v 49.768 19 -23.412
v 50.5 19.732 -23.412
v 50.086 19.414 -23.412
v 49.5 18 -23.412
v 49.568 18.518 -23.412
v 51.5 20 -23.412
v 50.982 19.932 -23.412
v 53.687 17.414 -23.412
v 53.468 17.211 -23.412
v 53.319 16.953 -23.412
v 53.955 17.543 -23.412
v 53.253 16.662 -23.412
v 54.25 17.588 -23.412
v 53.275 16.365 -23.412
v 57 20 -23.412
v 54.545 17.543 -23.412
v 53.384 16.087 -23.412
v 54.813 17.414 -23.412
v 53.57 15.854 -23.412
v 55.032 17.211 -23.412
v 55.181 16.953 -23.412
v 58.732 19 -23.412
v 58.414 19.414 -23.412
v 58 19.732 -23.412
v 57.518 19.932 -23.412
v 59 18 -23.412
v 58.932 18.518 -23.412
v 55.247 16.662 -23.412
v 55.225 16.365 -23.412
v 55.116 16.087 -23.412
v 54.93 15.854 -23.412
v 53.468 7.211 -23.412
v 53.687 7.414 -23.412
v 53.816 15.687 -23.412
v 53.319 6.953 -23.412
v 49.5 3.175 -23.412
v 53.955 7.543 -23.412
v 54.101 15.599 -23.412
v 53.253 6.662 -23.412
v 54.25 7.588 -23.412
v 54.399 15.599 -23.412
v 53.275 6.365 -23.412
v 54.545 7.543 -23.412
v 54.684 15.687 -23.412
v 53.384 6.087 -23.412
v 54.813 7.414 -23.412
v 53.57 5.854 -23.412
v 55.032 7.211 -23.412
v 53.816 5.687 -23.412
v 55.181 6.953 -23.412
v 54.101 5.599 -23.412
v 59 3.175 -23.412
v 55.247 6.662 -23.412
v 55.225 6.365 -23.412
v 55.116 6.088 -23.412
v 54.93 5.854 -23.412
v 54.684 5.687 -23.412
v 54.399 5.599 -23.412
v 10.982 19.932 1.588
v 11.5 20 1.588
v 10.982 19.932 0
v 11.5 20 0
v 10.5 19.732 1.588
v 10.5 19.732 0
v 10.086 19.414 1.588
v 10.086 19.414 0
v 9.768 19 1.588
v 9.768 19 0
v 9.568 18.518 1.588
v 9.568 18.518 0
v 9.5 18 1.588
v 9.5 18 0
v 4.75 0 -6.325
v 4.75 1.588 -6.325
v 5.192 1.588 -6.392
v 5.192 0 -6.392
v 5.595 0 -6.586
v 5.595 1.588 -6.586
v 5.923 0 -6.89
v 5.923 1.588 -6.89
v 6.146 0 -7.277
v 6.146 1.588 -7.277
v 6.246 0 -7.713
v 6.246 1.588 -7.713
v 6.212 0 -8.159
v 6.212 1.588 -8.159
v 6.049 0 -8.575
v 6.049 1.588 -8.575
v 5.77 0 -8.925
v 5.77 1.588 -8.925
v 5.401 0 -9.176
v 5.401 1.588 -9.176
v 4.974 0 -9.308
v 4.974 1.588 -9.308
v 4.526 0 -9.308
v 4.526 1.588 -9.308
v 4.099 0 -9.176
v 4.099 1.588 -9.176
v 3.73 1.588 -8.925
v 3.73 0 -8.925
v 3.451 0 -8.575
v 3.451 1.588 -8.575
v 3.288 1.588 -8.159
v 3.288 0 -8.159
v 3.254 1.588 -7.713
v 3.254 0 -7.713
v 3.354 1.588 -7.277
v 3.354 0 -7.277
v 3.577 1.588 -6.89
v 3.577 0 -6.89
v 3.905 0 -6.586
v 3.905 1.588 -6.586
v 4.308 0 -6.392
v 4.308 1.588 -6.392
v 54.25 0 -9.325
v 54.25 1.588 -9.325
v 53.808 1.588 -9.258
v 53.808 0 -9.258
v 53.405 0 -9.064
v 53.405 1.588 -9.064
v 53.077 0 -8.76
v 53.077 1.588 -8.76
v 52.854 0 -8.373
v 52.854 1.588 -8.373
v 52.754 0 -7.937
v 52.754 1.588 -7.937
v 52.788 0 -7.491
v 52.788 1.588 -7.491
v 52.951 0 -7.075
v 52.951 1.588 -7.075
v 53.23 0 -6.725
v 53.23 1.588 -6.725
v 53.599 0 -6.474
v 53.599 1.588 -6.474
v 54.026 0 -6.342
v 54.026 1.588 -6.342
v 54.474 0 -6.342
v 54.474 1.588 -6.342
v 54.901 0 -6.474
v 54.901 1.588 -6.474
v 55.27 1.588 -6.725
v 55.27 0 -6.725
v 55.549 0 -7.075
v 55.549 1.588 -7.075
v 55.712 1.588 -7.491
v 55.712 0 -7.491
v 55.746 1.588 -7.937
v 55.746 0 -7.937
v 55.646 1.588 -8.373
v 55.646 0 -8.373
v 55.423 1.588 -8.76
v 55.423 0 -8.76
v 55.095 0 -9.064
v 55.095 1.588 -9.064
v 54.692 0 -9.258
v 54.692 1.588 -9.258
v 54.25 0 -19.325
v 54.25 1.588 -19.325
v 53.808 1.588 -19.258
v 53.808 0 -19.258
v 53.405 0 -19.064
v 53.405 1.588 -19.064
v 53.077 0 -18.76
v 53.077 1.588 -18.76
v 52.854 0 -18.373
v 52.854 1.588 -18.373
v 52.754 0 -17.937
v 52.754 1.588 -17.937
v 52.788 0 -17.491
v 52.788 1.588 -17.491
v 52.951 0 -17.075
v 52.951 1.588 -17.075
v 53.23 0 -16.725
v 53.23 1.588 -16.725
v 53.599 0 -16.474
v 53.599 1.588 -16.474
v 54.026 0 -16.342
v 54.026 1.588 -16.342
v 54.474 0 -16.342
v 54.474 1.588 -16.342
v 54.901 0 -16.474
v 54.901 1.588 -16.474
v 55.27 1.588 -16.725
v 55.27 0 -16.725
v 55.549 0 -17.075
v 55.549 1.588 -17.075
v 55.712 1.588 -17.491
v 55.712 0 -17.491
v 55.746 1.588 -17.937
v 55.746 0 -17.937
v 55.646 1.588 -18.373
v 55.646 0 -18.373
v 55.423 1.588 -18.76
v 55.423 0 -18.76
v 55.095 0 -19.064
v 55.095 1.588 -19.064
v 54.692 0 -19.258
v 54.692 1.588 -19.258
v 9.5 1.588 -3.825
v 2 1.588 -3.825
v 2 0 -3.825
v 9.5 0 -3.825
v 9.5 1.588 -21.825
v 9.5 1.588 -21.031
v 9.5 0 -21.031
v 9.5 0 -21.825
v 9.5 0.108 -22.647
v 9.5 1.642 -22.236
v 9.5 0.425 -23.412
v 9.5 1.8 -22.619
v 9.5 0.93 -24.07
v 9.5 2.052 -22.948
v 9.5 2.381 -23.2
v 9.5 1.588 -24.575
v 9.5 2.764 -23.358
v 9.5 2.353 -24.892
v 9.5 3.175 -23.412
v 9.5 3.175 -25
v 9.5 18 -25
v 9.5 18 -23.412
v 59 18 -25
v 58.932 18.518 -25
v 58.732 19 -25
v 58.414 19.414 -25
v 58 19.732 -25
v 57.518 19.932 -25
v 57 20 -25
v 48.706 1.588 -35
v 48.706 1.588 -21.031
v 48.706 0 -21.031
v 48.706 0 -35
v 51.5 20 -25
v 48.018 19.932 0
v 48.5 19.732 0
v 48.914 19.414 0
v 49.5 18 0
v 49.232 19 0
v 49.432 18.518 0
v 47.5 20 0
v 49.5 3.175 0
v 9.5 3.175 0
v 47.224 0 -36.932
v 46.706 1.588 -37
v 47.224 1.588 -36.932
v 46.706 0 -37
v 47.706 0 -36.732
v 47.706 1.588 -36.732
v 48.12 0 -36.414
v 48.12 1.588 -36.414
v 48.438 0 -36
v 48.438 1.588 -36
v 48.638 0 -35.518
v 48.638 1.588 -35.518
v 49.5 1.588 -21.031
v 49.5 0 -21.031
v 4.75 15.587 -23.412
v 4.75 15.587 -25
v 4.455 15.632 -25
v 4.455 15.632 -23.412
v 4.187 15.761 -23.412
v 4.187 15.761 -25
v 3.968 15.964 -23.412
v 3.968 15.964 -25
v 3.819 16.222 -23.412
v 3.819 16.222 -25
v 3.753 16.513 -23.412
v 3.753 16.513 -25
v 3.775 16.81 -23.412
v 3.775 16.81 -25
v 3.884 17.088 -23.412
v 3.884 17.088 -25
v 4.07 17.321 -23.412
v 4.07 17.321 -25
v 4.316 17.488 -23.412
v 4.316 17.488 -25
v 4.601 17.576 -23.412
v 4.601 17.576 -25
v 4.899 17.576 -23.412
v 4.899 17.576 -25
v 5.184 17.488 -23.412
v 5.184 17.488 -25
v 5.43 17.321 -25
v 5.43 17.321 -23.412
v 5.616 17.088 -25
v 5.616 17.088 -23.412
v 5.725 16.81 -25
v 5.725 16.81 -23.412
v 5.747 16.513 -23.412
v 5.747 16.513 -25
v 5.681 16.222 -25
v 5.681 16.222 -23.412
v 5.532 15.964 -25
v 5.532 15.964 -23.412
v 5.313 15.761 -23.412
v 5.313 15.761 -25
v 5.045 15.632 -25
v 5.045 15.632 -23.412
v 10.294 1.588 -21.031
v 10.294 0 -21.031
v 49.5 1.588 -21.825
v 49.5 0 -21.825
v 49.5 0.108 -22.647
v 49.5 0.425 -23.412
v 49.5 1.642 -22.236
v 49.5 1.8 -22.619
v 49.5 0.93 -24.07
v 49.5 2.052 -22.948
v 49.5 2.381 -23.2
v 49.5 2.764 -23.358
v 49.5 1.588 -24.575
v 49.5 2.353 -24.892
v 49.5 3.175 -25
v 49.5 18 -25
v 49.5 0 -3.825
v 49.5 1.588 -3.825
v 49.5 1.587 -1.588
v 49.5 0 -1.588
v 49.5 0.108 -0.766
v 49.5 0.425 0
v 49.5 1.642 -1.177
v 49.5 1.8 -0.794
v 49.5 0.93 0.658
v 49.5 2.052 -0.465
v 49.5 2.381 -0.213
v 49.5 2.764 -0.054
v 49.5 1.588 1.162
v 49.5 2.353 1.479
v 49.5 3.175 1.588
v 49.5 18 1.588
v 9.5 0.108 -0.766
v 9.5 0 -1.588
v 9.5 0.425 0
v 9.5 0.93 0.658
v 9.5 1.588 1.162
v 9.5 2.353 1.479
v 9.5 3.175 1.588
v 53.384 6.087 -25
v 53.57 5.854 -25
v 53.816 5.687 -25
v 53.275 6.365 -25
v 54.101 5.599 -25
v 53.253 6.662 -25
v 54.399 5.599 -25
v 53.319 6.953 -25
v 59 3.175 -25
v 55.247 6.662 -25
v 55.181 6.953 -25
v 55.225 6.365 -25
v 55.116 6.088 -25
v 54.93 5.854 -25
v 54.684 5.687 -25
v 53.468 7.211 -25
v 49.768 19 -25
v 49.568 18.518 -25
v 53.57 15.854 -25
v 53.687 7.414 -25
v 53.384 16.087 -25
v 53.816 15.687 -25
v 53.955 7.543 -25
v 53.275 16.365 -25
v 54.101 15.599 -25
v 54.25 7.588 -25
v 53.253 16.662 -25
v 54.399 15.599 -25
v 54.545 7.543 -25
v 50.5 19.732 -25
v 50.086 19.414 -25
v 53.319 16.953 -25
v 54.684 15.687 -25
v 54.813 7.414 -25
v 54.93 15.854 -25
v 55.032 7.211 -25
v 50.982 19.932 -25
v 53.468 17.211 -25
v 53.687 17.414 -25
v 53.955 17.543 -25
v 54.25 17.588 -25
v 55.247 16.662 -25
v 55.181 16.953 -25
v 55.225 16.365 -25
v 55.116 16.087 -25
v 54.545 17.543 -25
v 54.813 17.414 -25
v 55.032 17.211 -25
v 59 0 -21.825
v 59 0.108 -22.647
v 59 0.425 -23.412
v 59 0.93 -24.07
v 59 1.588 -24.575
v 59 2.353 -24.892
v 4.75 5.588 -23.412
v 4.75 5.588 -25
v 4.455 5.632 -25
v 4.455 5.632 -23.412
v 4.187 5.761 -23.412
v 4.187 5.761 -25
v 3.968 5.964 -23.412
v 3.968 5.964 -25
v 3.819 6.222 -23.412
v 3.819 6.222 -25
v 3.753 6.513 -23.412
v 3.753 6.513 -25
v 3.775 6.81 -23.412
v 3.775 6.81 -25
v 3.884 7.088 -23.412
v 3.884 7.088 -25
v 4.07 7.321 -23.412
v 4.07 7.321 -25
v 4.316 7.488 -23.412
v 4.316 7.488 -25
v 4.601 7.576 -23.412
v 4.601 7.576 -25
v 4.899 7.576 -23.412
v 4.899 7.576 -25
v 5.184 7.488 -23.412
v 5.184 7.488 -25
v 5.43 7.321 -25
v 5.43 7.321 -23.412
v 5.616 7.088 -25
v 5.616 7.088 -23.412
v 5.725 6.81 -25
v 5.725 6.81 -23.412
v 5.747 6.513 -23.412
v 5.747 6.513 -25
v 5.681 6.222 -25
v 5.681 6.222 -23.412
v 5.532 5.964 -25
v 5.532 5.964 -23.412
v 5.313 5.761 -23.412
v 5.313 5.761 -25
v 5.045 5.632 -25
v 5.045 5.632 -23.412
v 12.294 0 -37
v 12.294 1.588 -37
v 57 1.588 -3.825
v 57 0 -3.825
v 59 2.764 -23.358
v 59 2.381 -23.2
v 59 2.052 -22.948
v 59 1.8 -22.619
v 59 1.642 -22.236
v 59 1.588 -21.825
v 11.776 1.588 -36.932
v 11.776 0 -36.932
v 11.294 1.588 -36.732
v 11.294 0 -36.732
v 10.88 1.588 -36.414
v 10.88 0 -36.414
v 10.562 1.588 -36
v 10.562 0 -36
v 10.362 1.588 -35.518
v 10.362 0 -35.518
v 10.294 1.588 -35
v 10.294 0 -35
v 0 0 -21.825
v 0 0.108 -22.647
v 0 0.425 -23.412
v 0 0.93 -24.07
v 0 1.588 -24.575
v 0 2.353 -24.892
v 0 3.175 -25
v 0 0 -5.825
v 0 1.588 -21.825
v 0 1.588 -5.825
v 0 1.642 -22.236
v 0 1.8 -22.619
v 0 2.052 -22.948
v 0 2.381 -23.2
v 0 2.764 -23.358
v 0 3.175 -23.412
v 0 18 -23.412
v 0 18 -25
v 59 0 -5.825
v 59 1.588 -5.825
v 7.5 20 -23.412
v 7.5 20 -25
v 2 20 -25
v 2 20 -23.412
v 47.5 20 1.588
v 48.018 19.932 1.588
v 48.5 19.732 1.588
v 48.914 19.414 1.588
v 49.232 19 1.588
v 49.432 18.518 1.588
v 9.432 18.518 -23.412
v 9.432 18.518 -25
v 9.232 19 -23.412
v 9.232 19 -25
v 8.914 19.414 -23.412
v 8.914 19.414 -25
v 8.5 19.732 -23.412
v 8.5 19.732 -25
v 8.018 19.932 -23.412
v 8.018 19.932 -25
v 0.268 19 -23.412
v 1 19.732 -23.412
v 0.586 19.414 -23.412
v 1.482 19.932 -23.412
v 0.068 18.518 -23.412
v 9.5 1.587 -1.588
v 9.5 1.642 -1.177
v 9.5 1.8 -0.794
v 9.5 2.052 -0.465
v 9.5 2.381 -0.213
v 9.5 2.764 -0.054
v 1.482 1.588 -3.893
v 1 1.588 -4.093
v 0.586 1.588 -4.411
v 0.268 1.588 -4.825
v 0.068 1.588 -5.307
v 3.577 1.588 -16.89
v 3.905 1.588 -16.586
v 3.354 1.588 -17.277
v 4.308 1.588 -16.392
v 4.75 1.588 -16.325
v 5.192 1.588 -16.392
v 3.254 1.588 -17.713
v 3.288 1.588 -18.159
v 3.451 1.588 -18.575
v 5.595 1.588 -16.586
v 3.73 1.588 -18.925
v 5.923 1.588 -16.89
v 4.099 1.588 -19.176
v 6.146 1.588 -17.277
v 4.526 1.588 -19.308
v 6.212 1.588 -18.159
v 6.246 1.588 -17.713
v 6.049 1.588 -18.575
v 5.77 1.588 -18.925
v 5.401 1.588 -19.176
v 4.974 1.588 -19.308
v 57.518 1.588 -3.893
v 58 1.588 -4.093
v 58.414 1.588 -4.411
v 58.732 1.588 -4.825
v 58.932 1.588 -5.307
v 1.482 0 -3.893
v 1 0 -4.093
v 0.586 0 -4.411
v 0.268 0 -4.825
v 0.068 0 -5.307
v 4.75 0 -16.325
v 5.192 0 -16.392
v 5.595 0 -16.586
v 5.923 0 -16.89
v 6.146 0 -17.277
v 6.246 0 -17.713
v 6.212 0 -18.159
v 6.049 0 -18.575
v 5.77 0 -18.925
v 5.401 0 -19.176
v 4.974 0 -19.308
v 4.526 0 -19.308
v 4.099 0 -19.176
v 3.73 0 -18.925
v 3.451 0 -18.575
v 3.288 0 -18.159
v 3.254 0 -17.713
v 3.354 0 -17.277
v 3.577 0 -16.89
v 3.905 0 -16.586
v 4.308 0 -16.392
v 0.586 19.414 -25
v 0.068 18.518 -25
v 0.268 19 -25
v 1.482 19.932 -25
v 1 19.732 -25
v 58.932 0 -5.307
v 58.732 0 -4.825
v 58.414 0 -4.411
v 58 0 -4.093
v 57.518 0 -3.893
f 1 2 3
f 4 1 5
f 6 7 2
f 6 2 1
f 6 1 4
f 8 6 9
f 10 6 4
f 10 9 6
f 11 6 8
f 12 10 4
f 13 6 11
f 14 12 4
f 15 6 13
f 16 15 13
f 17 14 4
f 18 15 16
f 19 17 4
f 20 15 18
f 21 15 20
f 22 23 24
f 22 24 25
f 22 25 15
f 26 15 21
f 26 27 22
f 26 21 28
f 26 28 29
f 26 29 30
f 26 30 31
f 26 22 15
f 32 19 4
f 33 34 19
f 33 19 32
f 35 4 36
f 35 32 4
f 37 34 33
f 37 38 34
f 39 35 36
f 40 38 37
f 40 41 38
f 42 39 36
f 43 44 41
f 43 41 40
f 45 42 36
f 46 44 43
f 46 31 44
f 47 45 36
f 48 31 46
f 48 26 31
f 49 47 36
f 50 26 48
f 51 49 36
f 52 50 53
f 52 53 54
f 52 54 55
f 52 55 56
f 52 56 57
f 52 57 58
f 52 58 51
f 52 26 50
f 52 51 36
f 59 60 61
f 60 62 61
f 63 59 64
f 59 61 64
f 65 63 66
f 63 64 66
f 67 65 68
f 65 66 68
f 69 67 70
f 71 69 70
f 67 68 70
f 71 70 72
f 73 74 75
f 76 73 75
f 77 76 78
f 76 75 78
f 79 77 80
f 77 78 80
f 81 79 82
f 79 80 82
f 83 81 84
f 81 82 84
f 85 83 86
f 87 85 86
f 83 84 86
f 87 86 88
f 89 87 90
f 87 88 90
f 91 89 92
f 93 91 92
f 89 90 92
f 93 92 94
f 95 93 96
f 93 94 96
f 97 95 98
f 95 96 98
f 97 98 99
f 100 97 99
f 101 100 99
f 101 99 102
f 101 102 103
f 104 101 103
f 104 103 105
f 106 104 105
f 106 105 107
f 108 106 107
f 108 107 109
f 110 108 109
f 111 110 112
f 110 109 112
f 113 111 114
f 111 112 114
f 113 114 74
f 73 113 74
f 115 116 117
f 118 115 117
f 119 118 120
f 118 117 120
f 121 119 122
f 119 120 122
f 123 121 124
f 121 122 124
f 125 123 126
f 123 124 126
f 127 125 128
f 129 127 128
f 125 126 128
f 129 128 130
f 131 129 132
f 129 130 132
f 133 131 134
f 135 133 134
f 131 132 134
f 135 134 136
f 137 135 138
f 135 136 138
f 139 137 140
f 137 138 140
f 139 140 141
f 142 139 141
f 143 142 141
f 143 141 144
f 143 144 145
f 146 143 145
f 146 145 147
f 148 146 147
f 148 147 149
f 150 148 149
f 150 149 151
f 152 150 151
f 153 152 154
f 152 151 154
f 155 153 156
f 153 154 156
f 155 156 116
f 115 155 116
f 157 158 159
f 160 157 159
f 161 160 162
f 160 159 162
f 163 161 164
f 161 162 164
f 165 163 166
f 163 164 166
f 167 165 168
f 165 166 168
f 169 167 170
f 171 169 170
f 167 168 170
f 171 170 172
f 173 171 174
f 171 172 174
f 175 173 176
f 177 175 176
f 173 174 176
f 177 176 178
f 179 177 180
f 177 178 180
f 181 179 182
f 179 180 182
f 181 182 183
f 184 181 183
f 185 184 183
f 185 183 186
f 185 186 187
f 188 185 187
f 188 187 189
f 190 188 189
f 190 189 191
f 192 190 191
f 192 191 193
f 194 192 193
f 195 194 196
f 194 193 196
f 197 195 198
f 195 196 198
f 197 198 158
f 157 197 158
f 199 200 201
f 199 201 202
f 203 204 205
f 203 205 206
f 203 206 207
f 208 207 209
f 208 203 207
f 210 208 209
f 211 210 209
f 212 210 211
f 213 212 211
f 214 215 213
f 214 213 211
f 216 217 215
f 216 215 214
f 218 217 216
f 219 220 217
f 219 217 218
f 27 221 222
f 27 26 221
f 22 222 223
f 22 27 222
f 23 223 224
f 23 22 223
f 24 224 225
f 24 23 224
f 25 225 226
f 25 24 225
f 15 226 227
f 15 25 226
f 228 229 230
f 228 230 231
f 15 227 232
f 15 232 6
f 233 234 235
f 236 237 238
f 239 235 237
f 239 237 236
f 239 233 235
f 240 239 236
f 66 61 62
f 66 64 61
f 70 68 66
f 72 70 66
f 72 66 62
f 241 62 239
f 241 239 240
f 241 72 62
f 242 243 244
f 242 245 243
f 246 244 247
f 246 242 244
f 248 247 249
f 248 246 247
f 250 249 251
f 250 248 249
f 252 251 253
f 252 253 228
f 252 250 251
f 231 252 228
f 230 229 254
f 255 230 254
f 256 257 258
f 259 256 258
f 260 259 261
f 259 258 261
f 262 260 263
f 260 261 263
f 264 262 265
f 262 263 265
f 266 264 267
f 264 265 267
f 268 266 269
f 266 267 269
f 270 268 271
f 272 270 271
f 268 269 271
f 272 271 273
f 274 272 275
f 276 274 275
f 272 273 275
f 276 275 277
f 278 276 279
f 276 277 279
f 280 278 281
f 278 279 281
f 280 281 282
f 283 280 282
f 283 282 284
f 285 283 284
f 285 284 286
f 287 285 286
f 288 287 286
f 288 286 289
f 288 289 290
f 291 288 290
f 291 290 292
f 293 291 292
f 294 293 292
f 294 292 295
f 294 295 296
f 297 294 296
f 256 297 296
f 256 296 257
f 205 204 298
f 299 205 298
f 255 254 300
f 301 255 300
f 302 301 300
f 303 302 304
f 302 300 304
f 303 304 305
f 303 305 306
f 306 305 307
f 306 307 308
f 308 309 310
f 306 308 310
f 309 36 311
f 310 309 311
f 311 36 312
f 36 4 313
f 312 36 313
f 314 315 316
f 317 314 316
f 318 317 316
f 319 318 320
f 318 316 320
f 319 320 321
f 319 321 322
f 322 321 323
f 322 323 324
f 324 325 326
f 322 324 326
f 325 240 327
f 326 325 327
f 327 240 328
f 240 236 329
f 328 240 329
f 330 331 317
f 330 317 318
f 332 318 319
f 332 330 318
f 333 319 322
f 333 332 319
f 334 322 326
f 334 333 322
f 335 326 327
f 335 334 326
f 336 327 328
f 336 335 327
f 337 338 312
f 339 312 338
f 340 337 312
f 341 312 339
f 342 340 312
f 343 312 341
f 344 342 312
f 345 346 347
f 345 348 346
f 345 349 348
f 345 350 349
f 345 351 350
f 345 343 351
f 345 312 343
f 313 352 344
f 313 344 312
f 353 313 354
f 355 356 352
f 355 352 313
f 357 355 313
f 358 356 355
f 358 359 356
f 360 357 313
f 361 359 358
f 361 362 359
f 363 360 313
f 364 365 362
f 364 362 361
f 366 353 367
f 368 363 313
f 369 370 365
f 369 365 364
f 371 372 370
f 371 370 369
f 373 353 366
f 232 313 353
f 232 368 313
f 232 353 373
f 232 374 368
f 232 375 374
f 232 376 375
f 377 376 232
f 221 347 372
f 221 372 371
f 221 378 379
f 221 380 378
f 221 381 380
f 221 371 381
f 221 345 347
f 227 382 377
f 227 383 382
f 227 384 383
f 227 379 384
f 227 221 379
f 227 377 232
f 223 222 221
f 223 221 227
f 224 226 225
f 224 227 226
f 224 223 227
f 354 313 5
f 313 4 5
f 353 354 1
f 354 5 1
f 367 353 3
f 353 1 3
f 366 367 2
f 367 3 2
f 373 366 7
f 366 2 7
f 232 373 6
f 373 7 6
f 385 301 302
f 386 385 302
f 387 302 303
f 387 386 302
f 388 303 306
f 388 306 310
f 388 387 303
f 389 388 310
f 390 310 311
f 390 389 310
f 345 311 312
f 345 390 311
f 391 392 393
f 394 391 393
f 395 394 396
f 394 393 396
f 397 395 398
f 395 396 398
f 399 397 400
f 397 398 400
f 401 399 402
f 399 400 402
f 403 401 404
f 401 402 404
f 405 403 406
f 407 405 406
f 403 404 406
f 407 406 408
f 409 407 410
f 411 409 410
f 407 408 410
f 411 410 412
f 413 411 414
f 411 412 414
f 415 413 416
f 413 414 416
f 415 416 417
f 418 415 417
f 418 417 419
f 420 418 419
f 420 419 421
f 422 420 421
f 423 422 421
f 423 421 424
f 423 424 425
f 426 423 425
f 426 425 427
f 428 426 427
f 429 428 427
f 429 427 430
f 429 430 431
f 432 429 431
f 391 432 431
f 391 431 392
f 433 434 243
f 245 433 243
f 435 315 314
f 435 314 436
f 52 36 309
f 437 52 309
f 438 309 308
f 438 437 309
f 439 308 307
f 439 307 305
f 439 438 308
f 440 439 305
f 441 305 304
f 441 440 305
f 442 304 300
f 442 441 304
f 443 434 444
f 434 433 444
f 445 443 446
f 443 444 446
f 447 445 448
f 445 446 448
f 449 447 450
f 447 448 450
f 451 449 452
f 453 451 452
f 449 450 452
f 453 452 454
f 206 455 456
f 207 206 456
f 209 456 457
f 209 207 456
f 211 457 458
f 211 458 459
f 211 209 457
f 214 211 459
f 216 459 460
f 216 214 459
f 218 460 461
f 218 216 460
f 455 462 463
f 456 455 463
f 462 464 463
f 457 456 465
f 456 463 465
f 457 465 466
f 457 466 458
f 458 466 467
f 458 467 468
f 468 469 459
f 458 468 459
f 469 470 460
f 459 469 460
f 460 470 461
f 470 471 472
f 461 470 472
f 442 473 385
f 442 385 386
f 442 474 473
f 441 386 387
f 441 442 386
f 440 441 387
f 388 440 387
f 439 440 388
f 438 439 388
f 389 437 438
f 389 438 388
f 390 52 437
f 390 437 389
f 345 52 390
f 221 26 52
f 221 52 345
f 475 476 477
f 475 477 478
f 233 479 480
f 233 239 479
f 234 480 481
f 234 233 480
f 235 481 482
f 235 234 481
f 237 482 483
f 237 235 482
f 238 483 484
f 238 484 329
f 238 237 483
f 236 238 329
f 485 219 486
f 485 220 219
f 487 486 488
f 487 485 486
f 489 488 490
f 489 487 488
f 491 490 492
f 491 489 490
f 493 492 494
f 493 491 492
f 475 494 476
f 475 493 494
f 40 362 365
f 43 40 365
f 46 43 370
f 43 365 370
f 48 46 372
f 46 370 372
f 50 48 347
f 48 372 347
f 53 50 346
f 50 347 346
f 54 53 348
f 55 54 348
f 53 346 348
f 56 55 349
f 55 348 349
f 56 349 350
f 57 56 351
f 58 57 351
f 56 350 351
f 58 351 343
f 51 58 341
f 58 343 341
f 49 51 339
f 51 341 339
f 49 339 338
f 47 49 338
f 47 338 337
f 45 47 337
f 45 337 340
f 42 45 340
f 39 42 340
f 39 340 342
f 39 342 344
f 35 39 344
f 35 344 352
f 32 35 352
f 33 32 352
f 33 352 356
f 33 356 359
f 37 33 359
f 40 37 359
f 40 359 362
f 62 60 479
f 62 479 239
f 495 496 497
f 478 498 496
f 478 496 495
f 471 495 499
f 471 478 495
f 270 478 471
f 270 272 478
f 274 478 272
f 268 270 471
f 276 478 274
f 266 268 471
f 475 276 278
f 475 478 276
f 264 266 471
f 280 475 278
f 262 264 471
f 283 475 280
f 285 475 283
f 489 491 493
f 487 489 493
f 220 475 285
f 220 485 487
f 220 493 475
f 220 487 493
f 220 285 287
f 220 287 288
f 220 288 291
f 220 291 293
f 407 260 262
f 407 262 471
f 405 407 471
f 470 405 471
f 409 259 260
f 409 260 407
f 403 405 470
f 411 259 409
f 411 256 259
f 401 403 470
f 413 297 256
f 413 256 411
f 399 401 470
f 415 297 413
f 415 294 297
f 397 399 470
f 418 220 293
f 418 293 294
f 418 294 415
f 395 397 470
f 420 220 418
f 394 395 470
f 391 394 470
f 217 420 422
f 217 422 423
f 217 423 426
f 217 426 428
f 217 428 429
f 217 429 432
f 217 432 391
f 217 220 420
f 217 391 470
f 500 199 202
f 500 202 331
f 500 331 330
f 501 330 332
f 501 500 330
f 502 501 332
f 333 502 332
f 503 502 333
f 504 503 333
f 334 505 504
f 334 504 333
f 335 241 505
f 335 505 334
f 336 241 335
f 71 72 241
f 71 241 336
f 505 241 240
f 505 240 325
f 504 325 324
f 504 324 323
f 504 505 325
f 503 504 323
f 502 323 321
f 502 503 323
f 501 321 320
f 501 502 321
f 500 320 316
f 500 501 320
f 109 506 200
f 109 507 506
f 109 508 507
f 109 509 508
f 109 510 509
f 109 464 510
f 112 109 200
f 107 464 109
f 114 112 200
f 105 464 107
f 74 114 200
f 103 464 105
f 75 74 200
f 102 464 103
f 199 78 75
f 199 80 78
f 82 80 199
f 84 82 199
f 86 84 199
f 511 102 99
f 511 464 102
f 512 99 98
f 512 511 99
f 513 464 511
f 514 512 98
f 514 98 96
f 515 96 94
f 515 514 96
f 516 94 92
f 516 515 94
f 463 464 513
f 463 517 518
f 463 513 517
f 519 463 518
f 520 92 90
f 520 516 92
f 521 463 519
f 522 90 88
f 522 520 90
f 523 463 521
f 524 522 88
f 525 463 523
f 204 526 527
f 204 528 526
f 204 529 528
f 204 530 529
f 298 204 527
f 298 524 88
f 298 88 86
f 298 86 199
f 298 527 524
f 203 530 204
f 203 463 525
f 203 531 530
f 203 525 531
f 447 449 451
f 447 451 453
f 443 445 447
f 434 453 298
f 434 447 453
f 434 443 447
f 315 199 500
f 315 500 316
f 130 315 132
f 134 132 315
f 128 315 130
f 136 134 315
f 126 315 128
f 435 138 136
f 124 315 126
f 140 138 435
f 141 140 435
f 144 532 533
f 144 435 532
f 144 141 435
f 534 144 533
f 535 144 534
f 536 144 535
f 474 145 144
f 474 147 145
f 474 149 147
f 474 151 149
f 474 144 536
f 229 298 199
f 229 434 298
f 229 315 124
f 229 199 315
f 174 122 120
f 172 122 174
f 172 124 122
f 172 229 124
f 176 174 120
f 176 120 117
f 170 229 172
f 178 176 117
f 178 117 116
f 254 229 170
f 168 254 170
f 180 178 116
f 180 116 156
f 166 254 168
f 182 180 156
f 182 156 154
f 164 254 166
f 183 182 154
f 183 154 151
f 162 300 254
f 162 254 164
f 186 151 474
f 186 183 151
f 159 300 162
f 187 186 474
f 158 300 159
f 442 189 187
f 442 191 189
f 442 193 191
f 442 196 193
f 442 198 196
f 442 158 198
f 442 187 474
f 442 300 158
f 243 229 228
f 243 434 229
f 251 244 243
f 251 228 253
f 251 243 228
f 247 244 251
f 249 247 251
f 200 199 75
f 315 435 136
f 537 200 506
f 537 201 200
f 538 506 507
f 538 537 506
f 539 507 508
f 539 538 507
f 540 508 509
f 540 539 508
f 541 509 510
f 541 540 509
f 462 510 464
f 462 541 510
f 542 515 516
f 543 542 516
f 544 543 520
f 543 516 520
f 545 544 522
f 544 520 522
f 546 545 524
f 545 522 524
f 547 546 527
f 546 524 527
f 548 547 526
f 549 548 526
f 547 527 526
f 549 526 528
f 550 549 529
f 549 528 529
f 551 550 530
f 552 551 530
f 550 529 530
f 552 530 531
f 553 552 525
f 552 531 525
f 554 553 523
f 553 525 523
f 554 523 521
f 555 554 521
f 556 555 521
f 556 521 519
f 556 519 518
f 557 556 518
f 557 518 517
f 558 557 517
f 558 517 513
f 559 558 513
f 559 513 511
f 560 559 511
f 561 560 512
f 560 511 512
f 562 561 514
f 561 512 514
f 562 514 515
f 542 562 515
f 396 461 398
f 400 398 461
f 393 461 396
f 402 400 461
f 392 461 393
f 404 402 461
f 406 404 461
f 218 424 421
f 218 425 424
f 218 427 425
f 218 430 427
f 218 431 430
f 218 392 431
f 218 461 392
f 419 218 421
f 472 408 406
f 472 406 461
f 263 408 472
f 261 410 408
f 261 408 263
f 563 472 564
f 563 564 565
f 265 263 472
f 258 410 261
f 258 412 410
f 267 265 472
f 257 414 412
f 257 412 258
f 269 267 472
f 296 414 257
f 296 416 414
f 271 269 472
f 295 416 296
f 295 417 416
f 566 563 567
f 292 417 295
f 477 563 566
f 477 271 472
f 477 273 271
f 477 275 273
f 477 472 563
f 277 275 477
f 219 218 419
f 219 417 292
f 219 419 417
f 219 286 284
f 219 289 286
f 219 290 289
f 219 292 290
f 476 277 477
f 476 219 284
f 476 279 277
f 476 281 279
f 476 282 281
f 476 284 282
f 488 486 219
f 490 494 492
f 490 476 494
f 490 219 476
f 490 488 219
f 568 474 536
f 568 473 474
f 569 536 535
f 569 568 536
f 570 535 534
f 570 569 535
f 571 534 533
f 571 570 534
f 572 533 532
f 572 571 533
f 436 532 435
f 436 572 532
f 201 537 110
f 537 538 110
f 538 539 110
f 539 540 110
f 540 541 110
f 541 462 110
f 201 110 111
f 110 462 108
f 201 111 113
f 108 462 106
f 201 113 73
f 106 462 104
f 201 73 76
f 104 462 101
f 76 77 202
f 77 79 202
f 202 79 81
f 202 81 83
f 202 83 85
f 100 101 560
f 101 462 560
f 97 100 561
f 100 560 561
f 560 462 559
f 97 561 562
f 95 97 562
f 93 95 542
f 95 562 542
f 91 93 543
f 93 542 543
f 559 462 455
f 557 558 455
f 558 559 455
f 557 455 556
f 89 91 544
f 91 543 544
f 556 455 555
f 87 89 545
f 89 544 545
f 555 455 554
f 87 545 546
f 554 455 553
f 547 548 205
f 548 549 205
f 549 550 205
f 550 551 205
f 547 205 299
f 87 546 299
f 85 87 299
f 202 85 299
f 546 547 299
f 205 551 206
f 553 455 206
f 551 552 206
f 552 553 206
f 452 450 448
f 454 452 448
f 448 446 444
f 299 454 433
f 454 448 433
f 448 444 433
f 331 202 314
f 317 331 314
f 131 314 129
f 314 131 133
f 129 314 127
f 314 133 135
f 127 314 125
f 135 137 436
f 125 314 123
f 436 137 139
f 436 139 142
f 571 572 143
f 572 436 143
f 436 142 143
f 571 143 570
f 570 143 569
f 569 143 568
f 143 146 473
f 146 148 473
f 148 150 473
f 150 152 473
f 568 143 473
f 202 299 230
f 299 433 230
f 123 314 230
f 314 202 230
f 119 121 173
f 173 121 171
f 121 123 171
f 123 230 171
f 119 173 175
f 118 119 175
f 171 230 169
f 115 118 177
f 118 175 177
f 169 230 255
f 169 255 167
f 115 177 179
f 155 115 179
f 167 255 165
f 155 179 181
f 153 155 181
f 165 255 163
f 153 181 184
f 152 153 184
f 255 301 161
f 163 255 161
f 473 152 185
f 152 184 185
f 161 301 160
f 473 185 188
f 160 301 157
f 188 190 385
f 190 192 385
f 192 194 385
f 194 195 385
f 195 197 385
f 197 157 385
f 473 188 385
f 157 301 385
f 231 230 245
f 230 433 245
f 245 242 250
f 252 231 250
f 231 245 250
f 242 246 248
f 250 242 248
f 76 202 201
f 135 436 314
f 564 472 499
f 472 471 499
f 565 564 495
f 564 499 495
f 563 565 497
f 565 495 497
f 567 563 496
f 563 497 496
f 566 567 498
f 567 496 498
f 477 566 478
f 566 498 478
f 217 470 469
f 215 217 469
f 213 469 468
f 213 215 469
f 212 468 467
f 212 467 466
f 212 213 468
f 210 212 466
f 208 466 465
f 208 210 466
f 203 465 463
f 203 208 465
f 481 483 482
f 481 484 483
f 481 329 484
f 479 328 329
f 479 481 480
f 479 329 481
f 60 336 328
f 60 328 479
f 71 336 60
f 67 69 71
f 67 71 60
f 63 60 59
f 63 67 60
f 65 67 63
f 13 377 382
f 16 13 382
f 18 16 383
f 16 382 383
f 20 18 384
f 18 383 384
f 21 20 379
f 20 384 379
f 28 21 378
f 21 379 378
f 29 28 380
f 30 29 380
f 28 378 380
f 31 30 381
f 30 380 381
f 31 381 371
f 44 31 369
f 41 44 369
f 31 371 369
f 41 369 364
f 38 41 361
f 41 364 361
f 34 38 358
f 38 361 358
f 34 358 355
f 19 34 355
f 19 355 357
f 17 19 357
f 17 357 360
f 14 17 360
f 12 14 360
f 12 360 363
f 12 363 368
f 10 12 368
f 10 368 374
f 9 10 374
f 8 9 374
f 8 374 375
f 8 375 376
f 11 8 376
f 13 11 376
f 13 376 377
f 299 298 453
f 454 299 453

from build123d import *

# Parameters (mm, degrees)
SKETCH2_W                     = 59
SKETCH2_H                     = 25
BOSS_EXTRUDE1_DEPTH           = 1.5875
EDGE_FLANGE2_STRIP_W          = 9.525
EDGE_FLANGE2_STRIP_H          = 1.5875
EDGE_FLANGE2_STRIP_CUT_DEPTH  = 9.5
EDGE_FLANGE2_RELIEF_W         = 10.31875
EDGE_FLANGE2_RELIEF_H         = 0.79375
EDGE_FLANGE2_RELIEF_CUT_DEPTH = 1.5875
EDGE_FLANGE2_DEPTH            = 9.5
EDGE_FLANGE3_STRIP_W          = 9.525
EDGE_FLANGE3_STRIP_H          = 1.5875
EDGE_FLANGE3_STRIP_CUT_DEPTH  = 9.5
EDGE_FLANGE3_RELIEF_W         = 10.31875
EDGE_FLANGE3_RELIEF_H         = 0.79375
EDGE_FLANGE3_RELIEF_CUT_DEPTH = 1.5875
EDGE_FLANGE3_DEPTH            = 9.5
CUT_EXTRUDE1_REACH            = 69.127
SKETCH16_R                    = 1
SKETCH18_W                    = 38.4125
SKETCH18_H                    = 12
BOSS_EXTRUDE2_DEPTH           = 1.5875
SKETCH19_R                    = 1.5
SKETCH19_W                    = 9.5
SKETCH19_H                    = 3.825
CUT_EXTRUDE2_DEPTH            = 1.5875
EDGE_FLANGE4_STRIP_W          = 9.525
EDGE_FLANGE4_STRIP_H          = 1.5875
EDGE_FLANGE4_STRIP_CUT_DEPTH  = 40
EDGE_FLANGE4_DEPTH            = 40
FILLET1_R                     = 2


# Sheet-metal steps are written as plain solids
with BuildPart() as part:
    # Sketch2 → Boss-Extrude1 (new body)
    with BuildSketch(Plane(origin=(0, 0, 0), x_dir=(1, 0, 0), z_dir=(0, 1, 0))):
        with Locations((29.5, 12.5)):
            Rectangle(SKETCH2_W, SKETCH2_H)
    extrude(amount=BOSS_EXTRUDE1_DEPTH)

    # Edge-Flange2 strip (across the edge) → Edge-Flange2 strip cut (cut)
    with BuildSketch(Plane(origin=(59, 1.5875, -25), x_dir=(0, 0, 1), z_dir=(-1, 0, 0))):
        with Locations((-1.5875, -0.79375)):
            Rectangle(EDGE_FLANGE2_STRIP_W, EDGE_FLANGE2_STRIP_H)
    extrude(amount=EDGE_FLANGE2_STRIP_CUT_DEPTH, mode=Mode.SUBTRACT)

    # Edge-Flange2 relief (on the sheet) → Edge-Flange2 relief cut (cut)
    with BuildSketch(Plane(origin=(59, 1.5875, -21.825), x_dir=(0, 0, 1), z_dir=(0, 1, 0))):
        with Locations((-4.365625, -9.896875)):
            Rectangle(EDGE_FLANGE2_RELIEF_W, EDGE_FLANGE2_RELIEF_H)
    extrude(amount=-EDGE_FLANGE2_RELIEF_CUT_DEPTH, mode=Mode.SUBTRACT)

    # Edge-Flange2 section (across the edge) → Edge-Flange2 (add)
    with BuildSketch(Plane(origin=(59, 1.5875, -25), x_dir=(0, 0, 1), z_dir=(-1, 0, 0))):
        with BuildLine():
            Line((0, 1.5875), (0, 18.4125))
            Line((0, 18.4125), (1.5875, 18.4125))
            Line((1.5875, 18.4125), (1.5875, 1.5875))
            ThreePointArc((1.5875, 1.5875), (2.052467985, 0.464967985), (3.175, 0))
            Line((3.175, 0), (3.175, -1.5875))
            ThreePointArc((3.175, -1.5875), (0.92993597, -0.65756403), (0, 1.5875))
        make_face()
    extrude(amount=EDGE_FLANGE2_DEPTH)

    # Edge-Flange3 strip (across the edge) → Edge-Flange3 strip cut (cut)
    with BuildSketch(Plane(origin=(9.5, 1.5875, -25), x_dir=(0, 0, 1), z_dir=(-1, 0, 0))):
        with Locations((-1.5875, -0.79375)):
            Rectangle(EDGE_FLANGE3_STRIP_W, EDGE_FLANGE3_STRIP_H)
    extrude(amount=EDGE_FLANGE3_STRIP_CUT_DEPTH, mode=Mode.SUBTRACT)

    # Edge-Flange3 relief (on the sheet) → Edge-Flange3 relief cut (cut)
    with BuildSketch(Plane(origin=(9.5, 1.5875, -21.825), x_dir=(0, 0, 1), z_dir=(0, 1, 0))):
        with Locations((-4.365625, 0.396875)):
            Rectangle(EDGE_FLANGE3_RELIEF_W, EDGE_FLANGE3_RELIEF_H)
    extrude(amount=-EDGE_FLANGE3_RELIEF_CUT_DEPTH, mode=Mode.SUBTRACT)

    # Edge-Flange3 section (across the edge) → Edge-Flange3 (add)
    with BuildSketch(Plane(origin=(9.5, 1.5875, -25), x_dir=(0, 0, 1), z_dir=(-1, 0, 0))):
        with BuildLine():
            Line((0, 1.5875), (0, 18.4125))
            Line((0, 18.4125), (1.5875, 18.4125))
            Line((1.5875, 18.4125), (1.5875, 1.5875))
            ThreePointArc((1.5875, 1.5875), (2.052467985, 0.464967985), (3.175, 0))
            Line((3.175, 0), (3.175, -1.5875))
            ThreePointArc((3.175, -1.5875), (0.92993597, -0.65756403), (0, 1.5875))
        make_face()
    extrude(amount=EDGE_FLANGE3_DEPTH)

    # Sketch16 → Cut-Extrude1 (cut, up to next)
    with BuildSketch(Plane(origin=(0, 0, -25), x_dir=(-1, 0, 0), z_dir=(0, 0, -1)), mode=Mode.PRIVATE) as cut_extrude1_sk1:
        with Locations(Location((-54.25, 16.5875, 0), (0, 0, 90))):
            Circle(SKETCH16_R)
    cut_extrude1_tool1 = extrude(cut_extrude1_sk1.sketch, amount=-CUT_EXTRUDE1_REACH, mode=Mode.PRIVATE) & part.part
    # Sketch16 → Cut-Extrude1 (cut, up to next)
    with BuildSketch(Plane(origin=(0, 0, -25), x_dir=(-1, 0, 0), z_dir=(0, 0, -1)), mode=Mode.PRIVATE) as cut_extrude1_sk2:
        with Locations(Location((-54.25, 6.5875, 0), (0, 0, 90))):
            Circle(SKETCH16_R)
    cut_extrude1_tool2 = extrude(cut_extrude1_sk2.sketch, amount=-CUT_EXTRUDE1_REACH, mode=Mode.PRIVATE) & part.part
    # Sketch16 → Cut-Extrude1 (cut, up to next)
    with BuildSketch(Plane(origin=(0, 0, -25), x_dir=(-1, 0, 0), z_dir=(0, 0, -1)), mode=Mode.PRIVATE) as cut_extrude1_sk3:
        with Locations(Location((-4.75, 6.5875, 0), (0, 0, 270))):
            Circle(SKETCH16_R)
    cut_extrude1_tool3 = extrude(cut_extrude1_sk3.sketch, amount=-CUT_EXTRUDE1_REACH, mode=Mode.PRIVATE) & part.part
    # Sketch16 → Cut-Extrude1 (cut, up to next)
    with BuildSketch(Plane(origin=(0, 0, -25), x_dir=(-1, 0, 0), z_dir=(0, 0, -1)), mode=Mode.PRIVATE) as cut_extrude1_sk4:
        with Locations(Location((-4.75, 16.5875, 0), (0, 0, 270))):
            Circle(SKETCH16_R)
    cut_extrude1_tool4 = extrude(cut_extrude1_sk4.sketch, amount=-CUT_EXTRUDE1_REACH, mode=Mode.PRIVATE) & part.part
    add(cut_extrude1_tool1.solids().sort_by_distance((54.25, 16.5875, -25))[0], mode=Mode.SUBTRACT)
    add(cut_extrude1_tool2.solids().sort_by_distance((54.25, 6.5875, -25))[0], mode=Mode.SUBTRACT)
    add(cut_extrude1_tool3.solids().sort_by_distance((4.75, 6.5875, -25))[0], mode=Mode.SUBTRACT)
    add(cut_extrude1_tool4.solids().sort_by_distance((4.75, 16.5875, -25))[0], mode=Mode.SUBTRACT)

    # Sketch18 → Boss-Extrude2 (add)
    with BuildSketch(Plane(origin=(0, 1.5875, 0), x_dir=(1, 0, 0), z_dir=(0, 1, 0))):
        with Locations((29.5, 31)):
            Rectangle(SKETCH18_W, SKETCH18_H)
    extrude(amount=-BOSS_EXTRUDE2_DEPTH)

    # Sketch19 → Cut-Extrude2 (cut)
    with BuildSketch(Plane(origin=(0, 1.5875, 0), x_dir=(1, 0, 0), z_dir=(0, 1, 0))):
        with Locations(Location((4.75, 17.825, 0), (0, 0, 270))):
            Circle(SKETCH19_R)
        with Locations(Location((4.75, 7.825, 0), (0, 0, 270))):
            Circle(SKETCH19_R)
        with Locations(Location((54.25, 17.825, 0), (0, 0, 90))):
            Circle(SKETCH19_R)
        with Locations(Location((54.25, 7.825, 0), (0, 0, 90))):
            Circle(SKETCH19_R)
        with Locations((54.25, 1.9125)):
            Rectangle(SKETCH19_W, SKETCH19_H)
        with Locations((4.75, 1.9125)):
            Rectangle(SKETCH19_W, SKETCH19_H)
    extrude(amount=-CUT_EXTRUDE2_DEPTH, mode=Mode.SUBTRACT)

    # Edge-Flange4 strip (across the edge) → Edge-Flange4 strip cut (cut)
    with BuildSketch(Plane(origin=(9.5, 1.5875, 0), x_dir=(0, 0, -1), z_dir=(1, 0, 0))):
        with Locations((-3.175, -0.79375)):
            Rectangle(EDGE_FLANGE4_STRIP_W, EDGE_FLANGE4_STRIP_H)
    extrude(amount=EDGE_FLANGE4_STRIP_CUT_DEPTH, mode=Mode.SUBTRACT)

    # Edge-Flange4 section (across the edge) → Edge-Flange4 (add)
    with BuildSketch(Plane(origin=(9.5, 1.5875, 0), x_dir=(0, 0, -1), z_dir=(1, 0, 0))):
        with BuildLine():
            Line((-1.5875, 1.5875), (-1.5875, 18.4125))
            Line((-1.5875, 18.4125), (0, 18.4125))
            Line((0, 18.4125), (0, 1.5875))
            ThreePointArc((0, 1.5875), (0.464967985, 0.464967985), (1.5875, 0))
            Line((1.5875, 0), (1.5875, -1.5875))
            ThreePointArc((1.5875, -1.5875), (-0.65756403, -0.65756403), (-1.5875, 1.5875))
        make_face()
    extrude(amount=EDGE_FLANGE4_DEPTH)

    # Fillet1
    fillet1_edges = [part.edges().sort_by_distance(p)[0] for p in [
        (10.29375, 0.79375, -37),
        (48.70625, 0.79375, -37),
        (0, 0.79375, -3.825),
        (59, 0.79375, -3.825),
        (9.5, 20, 0.79375),
        (49.5, 20, 0.79375),
        (59, 20, -24.20625),
        (49.5, 20, -24.20625),
        (9.5, 20, -24.20625),
        (0, 20, -24.20625),
    ]]
    fillet(fillet1_edges, radius=FILLET1_R)


solid = part.part
